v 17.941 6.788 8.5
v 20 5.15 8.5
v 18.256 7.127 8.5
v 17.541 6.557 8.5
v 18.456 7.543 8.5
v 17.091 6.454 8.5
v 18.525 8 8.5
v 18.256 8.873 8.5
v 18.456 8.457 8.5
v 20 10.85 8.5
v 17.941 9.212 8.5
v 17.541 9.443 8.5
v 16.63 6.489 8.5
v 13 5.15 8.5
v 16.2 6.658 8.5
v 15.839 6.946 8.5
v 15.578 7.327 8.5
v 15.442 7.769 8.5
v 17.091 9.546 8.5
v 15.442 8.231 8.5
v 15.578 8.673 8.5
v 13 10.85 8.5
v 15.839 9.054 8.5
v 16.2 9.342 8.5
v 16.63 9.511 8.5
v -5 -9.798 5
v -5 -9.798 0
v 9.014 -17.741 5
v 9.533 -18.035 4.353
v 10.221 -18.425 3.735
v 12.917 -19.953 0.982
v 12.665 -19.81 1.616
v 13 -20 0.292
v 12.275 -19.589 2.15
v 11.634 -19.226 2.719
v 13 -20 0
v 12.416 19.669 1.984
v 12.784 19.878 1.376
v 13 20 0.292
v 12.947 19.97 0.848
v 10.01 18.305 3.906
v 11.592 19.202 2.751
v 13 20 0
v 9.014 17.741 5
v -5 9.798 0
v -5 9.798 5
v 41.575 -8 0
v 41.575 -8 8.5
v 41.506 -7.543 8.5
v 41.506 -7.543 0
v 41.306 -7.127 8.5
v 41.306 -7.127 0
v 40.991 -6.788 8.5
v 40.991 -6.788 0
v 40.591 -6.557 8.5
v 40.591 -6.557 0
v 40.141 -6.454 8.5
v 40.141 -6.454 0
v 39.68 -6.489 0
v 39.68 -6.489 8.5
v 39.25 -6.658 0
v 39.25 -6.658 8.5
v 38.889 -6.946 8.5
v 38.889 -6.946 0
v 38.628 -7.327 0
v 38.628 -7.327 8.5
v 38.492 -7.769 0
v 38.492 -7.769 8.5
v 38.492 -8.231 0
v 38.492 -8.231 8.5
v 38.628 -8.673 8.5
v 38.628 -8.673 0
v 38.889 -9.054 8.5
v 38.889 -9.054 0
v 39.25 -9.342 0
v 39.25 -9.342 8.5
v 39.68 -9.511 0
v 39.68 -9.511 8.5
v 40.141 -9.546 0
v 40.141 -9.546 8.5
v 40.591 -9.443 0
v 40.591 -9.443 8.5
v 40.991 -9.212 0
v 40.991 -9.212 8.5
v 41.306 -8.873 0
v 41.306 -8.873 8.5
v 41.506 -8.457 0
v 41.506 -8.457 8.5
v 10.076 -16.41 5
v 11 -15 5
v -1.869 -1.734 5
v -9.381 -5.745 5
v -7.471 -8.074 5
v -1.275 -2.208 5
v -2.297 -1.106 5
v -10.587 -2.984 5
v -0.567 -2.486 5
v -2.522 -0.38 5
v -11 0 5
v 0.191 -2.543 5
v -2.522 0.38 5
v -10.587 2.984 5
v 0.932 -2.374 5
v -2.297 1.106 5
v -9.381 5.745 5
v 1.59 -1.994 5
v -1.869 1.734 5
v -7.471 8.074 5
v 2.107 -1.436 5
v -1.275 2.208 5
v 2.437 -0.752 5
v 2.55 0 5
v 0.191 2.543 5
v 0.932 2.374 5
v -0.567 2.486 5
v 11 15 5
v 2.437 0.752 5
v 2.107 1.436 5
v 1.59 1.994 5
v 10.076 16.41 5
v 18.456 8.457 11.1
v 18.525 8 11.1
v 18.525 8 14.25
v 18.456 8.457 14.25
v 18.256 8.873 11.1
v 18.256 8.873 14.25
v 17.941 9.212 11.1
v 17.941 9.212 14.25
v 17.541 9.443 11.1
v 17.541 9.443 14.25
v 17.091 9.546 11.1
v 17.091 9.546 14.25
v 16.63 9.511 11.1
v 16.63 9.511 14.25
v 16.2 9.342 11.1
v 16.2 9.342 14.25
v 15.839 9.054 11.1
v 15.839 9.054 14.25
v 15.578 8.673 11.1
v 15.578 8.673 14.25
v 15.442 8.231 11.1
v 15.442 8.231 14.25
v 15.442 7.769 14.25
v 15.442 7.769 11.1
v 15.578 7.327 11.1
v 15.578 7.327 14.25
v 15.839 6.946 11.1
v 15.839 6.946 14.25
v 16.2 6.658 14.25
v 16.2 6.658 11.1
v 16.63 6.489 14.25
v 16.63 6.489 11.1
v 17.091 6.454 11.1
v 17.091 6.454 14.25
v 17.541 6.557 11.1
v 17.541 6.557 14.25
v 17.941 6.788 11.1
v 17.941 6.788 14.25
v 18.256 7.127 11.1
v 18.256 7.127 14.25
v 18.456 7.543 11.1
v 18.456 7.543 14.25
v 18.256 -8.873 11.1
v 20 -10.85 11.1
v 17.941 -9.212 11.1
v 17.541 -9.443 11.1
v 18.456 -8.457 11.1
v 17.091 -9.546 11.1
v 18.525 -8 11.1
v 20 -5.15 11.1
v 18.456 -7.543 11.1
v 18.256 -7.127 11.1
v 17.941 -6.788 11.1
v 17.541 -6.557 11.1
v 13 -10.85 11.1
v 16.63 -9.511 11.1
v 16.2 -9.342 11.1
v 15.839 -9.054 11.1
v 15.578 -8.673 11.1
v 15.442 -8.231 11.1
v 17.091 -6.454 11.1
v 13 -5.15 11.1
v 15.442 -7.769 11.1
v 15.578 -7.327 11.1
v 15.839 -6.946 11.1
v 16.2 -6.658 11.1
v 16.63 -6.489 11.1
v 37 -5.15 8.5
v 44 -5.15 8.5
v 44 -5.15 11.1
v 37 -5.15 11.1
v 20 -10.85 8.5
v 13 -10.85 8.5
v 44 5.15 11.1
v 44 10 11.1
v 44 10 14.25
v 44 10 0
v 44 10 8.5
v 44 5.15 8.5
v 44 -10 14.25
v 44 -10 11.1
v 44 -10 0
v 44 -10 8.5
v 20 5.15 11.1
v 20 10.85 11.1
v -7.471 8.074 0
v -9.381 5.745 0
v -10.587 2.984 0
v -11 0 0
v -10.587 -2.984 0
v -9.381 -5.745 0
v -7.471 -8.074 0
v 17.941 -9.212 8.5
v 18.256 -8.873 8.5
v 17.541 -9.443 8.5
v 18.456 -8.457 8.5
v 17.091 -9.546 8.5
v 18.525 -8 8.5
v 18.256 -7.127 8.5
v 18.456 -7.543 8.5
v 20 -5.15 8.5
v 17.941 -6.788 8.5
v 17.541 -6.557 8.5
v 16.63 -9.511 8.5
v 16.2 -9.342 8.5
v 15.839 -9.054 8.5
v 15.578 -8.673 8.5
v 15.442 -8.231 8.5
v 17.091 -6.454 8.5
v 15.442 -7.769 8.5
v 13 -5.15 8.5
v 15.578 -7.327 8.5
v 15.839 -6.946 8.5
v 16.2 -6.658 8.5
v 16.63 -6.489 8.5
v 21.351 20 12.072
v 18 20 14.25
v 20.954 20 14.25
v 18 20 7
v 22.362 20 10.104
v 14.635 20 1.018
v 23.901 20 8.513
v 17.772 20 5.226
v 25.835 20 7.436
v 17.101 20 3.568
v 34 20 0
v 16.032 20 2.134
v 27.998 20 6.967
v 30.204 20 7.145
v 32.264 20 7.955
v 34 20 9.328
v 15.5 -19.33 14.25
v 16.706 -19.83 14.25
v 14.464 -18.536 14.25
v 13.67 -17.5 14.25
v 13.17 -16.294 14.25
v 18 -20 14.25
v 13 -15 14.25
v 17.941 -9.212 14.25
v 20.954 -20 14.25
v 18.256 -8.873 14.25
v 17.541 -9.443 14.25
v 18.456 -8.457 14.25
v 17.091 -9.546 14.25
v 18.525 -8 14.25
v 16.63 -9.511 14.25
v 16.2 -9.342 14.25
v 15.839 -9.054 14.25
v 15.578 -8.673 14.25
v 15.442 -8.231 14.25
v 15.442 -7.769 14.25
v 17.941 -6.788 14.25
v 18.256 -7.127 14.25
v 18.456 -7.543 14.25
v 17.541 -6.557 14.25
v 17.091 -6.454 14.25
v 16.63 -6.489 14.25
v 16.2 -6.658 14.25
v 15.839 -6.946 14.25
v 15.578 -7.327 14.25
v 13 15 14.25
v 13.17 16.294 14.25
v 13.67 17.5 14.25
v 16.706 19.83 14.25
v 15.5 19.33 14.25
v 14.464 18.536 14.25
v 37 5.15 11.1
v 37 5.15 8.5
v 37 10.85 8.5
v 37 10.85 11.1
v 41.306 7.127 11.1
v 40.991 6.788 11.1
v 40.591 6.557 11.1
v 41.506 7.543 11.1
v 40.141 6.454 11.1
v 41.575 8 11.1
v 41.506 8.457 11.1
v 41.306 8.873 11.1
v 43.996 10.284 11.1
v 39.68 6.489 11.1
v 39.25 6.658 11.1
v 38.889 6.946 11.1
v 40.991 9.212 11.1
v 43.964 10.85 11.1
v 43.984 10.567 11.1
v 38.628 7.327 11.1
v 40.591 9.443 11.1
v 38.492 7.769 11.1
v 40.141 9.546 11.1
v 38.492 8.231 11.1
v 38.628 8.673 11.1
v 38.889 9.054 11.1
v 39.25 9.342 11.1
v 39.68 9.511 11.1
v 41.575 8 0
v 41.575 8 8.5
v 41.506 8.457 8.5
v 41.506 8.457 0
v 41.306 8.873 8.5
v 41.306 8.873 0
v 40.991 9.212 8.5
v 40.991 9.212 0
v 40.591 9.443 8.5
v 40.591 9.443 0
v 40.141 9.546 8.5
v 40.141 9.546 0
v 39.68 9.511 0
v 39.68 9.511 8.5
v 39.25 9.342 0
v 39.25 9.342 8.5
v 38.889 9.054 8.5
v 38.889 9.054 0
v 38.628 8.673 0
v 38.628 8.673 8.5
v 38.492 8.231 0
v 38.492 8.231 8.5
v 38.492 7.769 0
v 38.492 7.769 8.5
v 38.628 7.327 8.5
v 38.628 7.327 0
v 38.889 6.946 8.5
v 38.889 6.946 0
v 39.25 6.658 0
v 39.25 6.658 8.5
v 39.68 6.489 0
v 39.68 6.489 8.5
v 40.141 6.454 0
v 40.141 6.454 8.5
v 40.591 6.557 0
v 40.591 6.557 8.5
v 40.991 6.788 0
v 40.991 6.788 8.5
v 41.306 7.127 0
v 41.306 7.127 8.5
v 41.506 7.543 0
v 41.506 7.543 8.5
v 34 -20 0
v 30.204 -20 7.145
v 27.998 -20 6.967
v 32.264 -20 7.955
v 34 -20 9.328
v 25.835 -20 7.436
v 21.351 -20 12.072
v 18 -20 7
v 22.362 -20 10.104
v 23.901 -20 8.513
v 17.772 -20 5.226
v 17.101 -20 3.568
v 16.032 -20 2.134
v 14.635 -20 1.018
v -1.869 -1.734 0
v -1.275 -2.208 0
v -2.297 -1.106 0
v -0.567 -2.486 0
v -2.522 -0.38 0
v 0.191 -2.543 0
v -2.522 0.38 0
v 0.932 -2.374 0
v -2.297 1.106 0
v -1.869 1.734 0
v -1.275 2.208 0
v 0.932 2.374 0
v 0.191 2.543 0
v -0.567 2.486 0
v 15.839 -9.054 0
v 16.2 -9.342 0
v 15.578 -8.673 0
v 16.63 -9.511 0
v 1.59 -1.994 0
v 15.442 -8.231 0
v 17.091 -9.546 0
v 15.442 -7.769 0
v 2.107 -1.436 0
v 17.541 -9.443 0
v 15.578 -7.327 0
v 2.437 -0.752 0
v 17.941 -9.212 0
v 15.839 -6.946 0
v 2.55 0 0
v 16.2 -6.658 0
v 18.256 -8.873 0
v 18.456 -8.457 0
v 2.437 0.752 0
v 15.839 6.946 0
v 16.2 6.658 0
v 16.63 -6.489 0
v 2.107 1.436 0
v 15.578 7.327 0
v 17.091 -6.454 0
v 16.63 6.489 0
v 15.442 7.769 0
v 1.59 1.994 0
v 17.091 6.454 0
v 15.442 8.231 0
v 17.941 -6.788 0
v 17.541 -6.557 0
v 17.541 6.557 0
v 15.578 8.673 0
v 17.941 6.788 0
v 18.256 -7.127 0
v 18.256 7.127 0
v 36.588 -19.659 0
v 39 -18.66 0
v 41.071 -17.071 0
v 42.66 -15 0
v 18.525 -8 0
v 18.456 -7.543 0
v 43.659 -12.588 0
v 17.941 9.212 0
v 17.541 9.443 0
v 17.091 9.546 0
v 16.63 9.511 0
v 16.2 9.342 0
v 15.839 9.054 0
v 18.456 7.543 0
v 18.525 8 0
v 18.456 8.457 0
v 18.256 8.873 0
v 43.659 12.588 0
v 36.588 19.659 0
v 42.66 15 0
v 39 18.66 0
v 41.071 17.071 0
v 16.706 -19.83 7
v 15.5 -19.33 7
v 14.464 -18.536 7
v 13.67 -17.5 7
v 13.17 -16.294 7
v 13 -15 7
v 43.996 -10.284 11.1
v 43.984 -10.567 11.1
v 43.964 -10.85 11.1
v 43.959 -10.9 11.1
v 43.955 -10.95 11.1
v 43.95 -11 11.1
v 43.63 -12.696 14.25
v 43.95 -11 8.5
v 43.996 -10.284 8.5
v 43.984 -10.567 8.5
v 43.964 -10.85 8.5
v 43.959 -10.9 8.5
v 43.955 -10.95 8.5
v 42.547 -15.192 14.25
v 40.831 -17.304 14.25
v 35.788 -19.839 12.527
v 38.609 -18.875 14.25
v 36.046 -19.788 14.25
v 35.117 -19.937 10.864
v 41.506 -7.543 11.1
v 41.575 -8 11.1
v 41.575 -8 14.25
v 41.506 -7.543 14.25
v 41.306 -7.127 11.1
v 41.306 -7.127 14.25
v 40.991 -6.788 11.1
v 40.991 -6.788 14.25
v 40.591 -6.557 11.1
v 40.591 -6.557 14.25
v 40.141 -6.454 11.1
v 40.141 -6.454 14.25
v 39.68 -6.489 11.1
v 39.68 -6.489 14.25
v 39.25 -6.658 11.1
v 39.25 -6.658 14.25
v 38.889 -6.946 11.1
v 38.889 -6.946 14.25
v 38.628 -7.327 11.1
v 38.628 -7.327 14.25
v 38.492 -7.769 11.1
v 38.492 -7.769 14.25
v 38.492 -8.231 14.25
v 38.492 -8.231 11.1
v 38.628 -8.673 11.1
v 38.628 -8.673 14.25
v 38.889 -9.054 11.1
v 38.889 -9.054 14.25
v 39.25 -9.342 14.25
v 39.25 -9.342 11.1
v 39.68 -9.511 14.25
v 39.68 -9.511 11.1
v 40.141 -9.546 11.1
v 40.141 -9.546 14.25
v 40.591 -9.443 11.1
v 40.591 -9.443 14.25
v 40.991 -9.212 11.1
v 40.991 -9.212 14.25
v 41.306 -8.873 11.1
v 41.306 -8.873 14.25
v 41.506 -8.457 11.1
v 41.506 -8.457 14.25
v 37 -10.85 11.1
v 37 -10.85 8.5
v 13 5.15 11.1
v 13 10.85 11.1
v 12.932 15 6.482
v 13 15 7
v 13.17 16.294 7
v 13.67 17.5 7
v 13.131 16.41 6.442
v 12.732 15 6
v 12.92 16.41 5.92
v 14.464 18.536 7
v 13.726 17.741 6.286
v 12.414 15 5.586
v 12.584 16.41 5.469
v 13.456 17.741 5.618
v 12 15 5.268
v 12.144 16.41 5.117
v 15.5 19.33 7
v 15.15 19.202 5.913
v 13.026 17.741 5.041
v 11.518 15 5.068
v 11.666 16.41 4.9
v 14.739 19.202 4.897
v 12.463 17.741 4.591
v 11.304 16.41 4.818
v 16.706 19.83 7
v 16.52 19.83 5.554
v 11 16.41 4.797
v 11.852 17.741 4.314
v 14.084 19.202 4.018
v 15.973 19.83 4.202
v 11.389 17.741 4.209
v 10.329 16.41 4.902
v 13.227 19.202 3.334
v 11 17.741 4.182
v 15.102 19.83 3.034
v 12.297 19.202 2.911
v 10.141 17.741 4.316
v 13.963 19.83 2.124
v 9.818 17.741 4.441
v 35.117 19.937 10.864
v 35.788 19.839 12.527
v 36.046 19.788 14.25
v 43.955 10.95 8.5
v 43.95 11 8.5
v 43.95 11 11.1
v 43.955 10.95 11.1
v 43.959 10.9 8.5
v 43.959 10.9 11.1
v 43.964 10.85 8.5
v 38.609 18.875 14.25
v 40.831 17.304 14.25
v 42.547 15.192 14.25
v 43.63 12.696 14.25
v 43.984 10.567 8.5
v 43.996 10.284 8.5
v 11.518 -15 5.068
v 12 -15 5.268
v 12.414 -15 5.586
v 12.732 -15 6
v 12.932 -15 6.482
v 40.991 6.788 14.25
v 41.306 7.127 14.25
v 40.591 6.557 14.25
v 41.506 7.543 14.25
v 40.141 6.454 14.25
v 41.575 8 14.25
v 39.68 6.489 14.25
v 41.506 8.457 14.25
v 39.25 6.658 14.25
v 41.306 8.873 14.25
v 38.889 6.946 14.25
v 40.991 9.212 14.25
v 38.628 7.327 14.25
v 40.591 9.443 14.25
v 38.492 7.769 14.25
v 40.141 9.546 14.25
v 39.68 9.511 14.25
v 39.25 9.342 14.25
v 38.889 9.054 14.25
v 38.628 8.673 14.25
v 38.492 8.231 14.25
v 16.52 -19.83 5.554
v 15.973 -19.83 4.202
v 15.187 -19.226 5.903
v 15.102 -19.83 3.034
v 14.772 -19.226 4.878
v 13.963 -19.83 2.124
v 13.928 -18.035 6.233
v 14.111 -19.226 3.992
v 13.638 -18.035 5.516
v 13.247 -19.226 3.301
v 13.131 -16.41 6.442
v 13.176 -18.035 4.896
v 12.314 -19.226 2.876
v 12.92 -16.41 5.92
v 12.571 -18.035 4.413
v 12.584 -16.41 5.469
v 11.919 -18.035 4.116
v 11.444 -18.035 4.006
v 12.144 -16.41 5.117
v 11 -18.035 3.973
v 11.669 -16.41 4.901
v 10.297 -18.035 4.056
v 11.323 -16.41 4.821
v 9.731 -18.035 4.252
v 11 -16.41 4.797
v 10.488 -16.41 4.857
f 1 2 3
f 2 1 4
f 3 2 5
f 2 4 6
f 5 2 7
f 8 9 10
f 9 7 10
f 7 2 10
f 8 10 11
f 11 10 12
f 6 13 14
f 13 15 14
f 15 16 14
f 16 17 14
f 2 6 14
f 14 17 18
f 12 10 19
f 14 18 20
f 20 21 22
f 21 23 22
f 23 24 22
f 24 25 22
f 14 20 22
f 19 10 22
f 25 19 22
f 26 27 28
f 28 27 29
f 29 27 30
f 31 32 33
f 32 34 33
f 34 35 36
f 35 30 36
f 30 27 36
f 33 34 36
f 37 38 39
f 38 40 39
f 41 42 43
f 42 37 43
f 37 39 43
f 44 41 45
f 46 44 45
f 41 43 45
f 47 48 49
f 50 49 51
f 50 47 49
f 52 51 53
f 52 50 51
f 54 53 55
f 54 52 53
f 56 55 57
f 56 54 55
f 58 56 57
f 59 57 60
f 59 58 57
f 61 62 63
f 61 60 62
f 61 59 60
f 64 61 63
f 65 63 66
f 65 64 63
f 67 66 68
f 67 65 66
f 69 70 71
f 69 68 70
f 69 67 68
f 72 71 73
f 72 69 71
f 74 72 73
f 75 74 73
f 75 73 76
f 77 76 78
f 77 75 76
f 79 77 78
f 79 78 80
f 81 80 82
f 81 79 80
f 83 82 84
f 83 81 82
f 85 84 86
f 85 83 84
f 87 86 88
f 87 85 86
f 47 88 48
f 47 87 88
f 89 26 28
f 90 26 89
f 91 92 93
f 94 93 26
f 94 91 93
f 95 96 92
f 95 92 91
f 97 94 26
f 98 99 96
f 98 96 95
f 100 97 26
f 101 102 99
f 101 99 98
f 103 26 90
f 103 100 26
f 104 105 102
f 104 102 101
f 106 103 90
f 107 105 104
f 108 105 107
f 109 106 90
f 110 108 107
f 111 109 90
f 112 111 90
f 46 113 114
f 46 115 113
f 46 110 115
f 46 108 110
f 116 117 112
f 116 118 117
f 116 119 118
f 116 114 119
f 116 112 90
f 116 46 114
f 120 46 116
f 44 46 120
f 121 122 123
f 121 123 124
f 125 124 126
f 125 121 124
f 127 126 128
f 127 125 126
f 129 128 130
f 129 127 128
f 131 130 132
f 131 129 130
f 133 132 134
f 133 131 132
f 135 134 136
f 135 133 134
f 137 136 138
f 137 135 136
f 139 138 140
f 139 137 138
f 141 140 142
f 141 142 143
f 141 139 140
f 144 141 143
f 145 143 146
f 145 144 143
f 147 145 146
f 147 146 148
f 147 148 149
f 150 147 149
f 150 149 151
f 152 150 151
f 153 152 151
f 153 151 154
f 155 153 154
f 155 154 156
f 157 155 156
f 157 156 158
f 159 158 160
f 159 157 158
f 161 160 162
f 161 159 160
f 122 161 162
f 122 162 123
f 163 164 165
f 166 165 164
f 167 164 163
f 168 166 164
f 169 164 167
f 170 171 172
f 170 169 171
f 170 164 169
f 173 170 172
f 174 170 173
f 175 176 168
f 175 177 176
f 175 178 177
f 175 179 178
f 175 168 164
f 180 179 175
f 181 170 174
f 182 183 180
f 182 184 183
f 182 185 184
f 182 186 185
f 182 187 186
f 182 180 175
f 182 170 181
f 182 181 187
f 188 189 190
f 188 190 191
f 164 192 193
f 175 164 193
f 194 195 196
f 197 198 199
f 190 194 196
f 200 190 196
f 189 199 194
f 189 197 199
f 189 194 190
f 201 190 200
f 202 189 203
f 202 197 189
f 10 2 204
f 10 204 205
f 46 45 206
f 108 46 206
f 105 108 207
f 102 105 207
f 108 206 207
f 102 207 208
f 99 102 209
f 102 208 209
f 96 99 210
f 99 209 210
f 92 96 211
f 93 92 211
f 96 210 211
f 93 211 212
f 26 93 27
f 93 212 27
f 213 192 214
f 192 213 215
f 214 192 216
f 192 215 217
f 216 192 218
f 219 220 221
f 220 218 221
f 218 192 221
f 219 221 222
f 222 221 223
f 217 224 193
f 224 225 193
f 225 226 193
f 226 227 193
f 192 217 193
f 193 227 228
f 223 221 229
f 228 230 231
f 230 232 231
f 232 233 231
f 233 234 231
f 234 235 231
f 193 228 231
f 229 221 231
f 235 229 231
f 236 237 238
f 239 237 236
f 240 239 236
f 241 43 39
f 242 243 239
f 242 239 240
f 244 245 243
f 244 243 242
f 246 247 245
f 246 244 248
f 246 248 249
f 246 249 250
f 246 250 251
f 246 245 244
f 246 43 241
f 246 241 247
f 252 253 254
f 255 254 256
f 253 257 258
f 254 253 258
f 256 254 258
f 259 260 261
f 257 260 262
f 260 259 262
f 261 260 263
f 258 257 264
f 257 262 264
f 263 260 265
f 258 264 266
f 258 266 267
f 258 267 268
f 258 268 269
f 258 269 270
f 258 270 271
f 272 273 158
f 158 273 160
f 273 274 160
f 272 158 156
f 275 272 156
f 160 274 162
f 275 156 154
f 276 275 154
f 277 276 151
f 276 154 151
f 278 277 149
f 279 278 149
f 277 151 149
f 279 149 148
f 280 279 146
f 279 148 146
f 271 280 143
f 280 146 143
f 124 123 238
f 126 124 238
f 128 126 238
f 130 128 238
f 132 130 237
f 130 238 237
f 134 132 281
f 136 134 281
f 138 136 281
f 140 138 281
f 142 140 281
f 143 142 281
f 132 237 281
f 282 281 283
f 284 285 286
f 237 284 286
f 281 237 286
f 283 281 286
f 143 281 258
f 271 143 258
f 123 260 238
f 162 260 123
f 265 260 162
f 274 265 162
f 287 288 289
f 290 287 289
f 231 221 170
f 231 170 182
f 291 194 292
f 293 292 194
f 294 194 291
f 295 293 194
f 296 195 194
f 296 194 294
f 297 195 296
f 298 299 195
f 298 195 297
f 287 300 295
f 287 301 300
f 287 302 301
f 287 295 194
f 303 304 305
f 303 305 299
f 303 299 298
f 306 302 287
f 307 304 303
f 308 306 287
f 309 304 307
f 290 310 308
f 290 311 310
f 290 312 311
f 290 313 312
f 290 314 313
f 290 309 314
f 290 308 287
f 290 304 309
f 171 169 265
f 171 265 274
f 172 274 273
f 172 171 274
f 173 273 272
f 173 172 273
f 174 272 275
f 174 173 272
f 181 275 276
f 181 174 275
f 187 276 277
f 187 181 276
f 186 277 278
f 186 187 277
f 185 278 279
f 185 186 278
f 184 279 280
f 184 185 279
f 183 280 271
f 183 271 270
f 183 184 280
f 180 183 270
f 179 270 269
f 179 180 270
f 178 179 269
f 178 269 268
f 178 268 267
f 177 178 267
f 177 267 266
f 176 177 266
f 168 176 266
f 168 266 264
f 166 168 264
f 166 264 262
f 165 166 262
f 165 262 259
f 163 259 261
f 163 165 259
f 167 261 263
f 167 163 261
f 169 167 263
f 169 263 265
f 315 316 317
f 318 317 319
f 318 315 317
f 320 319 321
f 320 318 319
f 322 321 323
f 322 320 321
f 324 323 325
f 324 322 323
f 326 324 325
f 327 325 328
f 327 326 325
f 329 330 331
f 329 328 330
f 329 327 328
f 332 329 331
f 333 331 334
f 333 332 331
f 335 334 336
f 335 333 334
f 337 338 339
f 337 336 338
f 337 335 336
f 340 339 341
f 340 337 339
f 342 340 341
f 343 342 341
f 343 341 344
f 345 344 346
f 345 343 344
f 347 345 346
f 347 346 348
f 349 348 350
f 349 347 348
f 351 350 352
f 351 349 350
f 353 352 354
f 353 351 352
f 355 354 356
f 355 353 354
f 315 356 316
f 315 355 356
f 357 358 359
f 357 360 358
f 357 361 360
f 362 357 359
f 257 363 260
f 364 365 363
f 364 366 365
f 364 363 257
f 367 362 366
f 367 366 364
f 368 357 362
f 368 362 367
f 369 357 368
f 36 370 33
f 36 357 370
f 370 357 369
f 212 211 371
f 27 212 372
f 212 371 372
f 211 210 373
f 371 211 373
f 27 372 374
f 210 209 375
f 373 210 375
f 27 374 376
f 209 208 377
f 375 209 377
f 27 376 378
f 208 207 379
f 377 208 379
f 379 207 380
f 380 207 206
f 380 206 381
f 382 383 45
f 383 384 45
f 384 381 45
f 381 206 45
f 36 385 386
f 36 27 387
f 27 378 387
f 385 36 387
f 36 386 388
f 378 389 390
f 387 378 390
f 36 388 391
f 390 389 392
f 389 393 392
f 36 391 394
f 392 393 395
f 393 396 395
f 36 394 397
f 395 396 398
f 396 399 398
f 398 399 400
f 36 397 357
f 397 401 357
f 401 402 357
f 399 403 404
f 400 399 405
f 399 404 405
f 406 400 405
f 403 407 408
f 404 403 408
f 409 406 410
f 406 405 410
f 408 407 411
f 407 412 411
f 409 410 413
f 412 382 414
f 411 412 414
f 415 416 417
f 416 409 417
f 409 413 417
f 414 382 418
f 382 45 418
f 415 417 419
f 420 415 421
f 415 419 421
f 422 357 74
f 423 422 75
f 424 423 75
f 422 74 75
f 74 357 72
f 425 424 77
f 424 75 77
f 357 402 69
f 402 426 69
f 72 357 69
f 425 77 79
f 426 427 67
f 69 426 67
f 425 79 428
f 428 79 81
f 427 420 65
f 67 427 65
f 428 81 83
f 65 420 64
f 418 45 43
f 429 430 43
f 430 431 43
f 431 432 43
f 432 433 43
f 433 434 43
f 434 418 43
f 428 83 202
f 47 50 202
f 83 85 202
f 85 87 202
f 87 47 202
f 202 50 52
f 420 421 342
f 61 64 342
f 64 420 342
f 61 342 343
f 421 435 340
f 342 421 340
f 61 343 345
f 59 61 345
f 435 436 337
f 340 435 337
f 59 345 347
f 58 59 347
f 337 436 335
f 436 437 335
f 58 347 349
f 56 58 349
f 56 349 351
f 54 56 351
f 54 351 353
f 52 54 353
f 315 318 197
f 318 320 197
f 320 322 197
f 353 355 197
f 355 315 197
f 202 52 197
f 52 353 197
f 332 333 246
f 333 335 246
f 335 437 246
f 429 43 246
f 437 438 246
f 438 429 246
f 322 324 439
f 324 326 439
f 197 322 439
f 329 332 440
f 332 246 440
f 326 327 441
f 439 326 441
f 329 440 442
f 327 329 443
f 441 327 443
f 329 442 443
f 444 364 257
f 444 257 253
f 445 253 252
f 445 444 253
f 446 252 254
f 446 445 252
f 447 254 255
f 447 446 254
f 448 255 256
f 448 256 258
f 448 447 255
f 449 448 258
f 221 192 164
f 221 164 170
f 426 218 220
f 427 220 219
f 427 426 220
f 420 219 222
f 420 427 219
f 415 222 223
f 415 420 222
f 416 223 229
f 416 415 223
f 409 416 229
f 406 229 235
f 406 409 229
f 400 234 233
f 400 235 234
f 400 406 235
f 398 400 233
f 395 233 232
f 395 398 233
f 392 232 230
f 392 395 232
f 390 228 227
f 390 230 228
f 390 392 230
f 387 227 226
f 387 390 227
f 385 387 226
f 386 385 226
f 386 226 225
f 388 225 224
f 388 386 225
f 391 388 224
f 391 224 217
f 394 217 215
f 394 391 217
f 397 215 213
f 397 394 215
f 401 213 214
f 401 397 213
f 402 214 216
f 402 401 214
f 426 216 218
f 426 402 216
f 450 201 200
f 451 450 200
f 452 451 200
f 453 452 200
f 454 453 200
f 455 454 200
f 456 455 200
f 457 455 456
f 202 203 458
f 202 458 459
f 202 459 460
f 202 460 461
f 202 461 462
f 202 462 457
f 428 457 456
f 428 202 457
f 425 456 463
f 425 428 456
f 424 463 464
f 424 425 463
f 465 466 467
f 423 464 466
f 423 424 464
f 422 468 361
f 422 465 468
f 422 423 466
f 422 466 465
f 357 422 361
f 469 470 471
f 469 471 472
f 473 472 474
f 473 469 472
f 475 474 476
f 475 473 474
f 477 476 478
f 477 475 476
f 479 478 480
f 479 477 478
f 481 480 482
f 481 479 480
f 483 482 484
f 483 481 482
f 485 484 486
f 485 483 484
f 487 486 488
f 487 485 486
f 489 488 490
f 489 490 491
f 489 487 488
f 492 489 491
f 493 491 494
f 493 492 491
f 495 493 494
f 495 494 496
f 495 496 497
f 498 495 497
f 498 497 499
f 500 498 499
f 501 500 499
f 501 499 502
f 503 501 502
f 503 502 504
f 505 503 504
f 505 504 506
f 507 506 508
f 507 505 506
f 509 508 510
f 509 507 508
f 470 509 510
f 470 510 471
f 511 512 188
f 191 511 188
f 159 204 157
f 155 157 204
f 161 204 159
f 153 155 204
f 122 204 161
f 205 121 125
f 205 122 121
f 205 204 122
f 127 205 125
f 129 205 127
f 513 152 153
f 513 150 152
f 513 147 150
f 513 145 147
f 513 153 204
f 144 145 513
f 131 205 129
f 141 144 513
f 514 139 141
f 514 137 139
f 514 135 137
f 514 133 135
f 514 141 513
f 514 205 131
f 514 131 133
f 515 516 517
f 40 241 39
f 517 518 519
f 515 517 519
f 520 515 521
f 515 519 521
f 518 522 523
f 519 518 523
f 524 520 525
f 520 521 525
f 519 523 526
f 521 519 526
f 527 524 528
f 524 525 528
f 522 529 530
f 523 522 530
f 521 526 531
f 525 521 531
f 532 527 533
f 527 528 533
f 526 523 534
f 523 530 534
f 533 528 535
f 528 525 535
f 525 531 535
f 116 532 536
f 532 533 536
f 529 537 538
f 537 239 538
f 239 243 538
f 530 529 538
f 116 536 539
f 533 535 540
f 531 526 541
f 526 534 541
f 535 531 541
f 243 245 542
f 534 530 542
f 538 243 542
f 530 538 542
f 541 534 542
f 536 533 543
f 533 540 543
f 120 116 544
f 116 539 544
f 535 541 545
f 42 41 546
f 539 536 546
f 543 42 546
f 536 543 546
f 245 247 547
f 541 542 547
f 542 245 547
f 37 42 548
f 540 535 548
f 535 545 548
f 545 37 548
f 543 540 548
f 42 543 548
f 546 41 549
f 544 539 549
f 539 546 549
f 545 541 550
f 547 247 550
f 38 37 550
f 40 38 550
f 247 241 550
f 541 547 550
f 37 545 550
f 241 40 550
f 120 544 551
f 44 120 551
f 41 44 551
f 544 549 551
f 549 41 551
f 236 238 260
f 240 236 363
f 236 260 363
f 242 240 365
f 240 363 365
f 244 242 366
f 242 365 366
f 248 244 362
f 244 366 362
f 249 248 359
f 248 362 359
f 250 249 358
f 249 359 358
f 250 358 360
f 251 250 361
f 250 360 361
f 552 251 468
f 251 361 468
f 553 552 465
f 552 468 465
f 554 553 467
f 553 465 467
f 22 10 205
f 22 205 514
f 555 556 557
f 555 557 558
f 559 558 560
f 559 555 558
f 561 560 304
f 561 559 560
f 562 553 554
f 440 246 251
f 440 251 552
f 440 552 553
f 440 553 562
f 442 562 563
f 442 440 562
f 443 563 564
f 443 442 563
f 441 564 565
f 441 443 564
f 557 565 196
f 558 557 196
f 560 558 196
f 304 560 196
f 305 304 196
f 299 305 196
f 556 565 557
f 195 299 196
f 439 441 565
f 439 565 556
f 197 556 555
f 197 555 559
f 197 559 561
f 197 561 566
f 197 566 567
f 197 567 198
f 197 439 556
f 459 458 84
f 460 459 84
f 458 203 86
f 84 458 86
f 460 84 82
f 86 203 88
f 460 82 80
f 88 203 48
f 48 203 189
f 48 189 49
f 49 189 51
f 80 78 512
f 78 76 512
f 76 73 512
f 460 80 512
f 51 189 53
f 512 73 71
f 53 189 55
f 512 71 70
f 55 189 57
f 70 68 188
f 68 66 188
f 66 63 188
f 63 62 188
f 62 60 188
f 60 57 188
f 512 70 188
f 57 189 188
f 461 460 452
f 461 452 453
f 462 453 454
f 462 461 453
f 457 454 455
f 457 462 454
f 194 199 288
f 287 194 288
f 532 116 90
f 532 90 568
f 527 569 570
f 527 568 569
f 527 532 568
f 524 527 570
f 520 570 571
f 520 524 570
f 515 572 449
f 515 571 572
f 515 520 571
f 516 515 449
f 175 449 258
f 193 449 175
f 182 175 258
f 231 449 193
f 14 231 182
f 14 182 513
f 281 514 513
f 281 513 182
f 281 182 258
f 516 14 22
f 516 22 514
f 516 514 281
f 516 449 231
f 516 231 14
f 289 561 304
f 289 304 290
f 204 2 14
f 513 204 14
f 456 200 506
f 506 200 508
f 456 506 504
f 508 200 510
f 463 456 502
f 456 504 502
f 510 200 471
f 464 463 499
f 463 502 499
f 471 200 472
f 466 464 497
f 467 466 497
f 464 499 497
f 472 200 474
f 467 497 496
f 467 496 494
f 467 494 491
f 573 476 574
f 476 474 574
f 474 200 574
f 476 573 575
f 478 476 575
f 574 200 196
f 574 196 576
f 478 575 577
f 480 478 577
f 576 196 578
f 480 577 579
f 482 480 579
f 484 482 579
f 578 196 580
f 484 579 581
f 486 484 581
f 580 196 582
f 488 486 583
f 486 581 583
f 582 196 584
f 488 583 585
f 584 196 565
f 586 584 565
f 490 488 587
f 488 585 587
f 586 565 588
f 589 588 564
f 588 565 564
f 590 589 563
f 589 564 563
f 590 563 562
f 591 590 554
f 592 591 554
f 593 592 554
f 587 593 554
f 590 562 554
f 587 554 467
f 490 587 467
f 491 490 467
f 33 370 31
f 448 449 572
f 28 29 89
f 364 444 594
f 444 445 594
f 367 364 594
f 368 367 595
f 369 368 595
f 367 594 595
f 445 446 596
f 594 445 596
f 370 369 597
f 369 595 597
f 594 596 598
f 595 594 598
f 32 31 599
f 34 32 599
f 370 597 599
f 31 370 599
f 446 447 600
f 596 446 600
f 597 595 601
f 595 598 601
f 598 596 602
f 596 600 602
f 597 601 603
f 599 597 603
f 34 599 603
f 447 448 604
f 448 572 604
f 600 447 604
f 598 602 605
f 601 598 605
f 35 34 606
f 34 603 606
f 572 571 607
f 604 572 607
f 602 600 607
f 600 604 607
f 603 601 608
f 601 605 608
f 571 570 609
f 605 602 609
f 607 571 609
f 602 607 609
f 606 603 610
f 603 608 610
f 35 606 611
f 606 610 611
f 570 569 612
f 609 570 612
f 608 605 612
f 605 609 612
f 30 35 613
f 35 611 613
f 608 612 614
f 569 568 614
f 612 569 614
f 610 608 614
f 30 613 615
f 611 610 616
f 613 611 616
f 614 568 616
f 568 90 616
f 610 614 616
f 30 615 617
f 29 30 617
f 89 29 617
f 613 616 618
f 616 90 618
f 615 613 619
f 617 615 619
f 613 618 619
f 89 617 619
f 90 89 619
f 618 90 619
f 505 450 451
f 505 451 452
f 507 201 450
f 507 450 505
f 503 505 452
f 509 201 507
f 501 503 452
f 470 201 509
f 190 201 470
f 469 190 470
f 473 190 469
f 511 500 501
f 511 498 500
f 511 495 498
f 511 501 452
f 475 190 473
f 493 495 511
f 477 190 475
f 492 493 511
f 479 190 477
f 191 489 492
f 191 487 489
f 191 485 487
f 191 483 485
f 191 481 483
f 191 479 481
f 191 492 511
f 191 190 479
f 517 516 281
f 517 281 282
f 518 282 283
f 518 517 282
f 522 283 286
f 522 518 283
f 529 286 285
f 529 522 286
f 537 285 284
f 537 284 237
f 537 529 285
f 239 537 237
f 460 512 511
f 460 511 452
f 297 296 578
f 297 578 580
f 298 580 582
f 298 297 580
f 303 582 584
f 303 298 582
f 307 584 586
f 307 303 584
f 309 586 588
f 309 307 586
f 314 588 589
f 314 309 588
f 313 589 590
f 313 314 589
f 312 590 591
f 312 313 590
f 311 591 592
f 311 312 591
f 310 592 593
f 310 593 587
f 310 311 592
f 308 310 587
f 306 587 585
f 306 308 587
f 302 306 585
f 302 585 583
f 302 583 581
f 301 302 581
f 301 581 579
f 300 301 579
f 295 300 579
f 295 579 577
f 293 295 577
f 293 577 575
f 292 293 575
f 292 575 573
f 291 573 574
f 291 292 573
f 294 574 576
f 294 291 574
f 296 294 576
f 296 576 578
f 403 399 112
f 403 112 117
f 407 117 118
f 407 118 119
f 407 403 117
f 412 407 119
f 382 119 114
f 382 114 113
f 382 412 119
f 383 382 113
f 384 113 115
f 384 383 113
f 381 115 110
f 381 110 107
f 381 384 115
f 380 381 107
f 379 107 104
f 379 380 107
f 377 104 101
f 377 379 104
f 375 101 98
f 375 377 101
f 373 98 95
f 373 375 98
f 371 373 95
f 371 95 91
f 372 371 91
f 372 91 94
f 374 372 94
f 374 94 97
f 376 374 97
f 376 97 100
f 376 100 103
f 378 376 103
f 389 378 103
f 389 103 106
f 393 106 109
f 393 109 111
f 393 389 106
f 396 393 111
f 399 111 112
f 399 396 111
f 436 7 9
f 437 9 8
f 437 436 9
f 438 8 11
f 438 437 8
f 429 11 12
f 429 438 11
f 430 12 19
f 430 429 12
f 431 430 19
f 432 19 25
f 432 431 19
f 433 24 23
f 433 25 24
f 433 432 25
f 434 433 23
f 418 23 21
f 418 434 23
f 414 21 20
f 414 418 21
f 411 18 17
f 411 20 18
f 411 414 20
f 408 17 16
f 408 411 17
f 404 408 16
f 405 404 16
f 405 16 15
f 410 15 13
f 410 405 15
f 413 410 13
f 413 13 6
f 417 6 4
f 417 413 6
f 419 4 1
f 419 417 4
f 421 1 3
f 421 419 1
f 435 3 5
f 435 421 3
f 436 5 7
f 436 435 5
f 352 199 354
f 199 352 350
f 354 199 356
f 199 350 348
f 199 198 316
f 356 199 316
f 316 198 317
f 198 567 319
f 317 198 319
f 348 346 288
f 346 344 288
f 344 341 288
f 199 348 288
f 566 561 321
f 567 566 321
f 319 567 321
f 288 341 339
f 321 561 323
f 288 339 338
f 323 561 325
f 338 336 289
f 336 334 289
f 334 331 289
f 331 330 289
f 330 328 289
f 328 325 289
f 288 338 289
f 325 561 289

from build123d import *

# Parameters (mm, degrees)
SKETCH_3_R          = 2.55
SKETCH_3_R_2        = 1.55
EXTRUDE_1_DEPTH     = 5
SKETCH_4_R          = 1.55
EXTRUDE_2_DEPTH     = 9.25
FILLET_2_R          = 2
FILLET_START        = 6.9999999
FILLET_3_2_DEPTH    = 8.0000001
SKETCH_5_W          = 7
SKETCH_5_H          = 6
CUT_EXTRUDE_1_DEPTH = 2.6
SKETCH_6_R          = 7.55
CUT_EXTRUDE_2_DEPTH = 62.147874109
EXTRUDE_START       = 2.6
SKETCH_7_W          = 7
SKETCH_7_H          = 0.15
EXTRUDE_3_DEPTH     = 2.6


with BuildPart() as part:
    # 草图3 → 凸台-拉伸1 (new body)
    with BuildSketch(Plane.XY):
        with BuildLine():
            Line((13, 20), (-5, 9.797958971))
            ThreePointArc((-5, 9.797958971), (-11, 0), (-5, -9.797958971))
            Line((-5, -9.797958971), (13, -20))
            Line((13, -20), (34, -20))
            ThreePointArc((34, -20), (41.071067812, -17.071067812), (44, -10))
            Line((44, -10), (44, 10))
            ThreePointArc((44, 10), (41.071067812, 17.071067812), (34, 20))
            Line((34, 20), (13, 20))
        make_face()
        Circle(SKETCH_3_R, mode=Mode.SUBTRACT)
        with Locations((16.975, -8)):
            Circle(SKETCH_3_R_2, mode=Mode.SUBTRACT)
        with Locations((16.975, 8)):
            Circle(SKETCH_3_R_2, mode=Mode.SUBTRACT)
        with Locations((40.025, 8)):
            Circle(SKETCH_3_R_2, mode=Mode.SUBTRACT)
        with Locations((40.025, -8)):
            Circle(SKETCH_3_R_2, mode=Mode.SUBTRACT)
    extrude(amount=EXTRUDE_1_DEPTH)

    # 草图4 → 凸台-拉伸2 (add)
    with BuildSketch(Plane.XY.offset(5)):
        with BuildLine():
            Line((13, -15), (13, 15))
            Line((13, 15), (13, 20))
            Line((13, 20), (18, 20))
            Line((18, 20), (34, 20))
            ThreePointArc((34, 20), (41.071067812, 17.071067812), (44, 10))
            Line((44, 10), (44, -10))
            ThreePointArc((44, -10), (41.071067812, -17.071067812), (34, -20))
            Line((34, -20), (18, -20))
            Line((18, -20), (13, -20))
            Line((13, -20), (13, -15))
        make_face()
        with Locations((16.975, 8)):
            Circle(SKETCH_4_R, mode=Mode.SUBTRACT)
        with Locations((16.975, -8)):
            Circle(SKETCH_4_R, mode=Mode.SUBTRACT)
        with Locations((40.025, -8)):
            Circle(SKETCH_4_R, mode=Mode.SUBTRACT)
        with Locations((40.025, 8)):
            Circle(SKETCH_4_R, mode=Mode.SUBTRACT)
    extrude(amount=EXTRUDE_2_DEPTH)

    # 圆角2
    fillet_2_edges = [part.edges().sort_by_distance(p)[0] for p in [
        (13, 0, 5),
    ]]
    fillet(fillet_2_edges, radius=FILLET_2_R)

    # 圆角3: read off the stored shape, not the designer's step
    # 圆角3 outline → 圆角3 (revolve, cut)
    with BuildSketch(Plane(origin=(11, 0, 7), x_dir=(1, 0, 0), z_dir=(0, 0, 1))):
        with BuildLine():
            ThreePointArc((7, -20), (3.464466094, -18.535533906), (2, -15))
            Line((2, -15), (2, -20))
            Line((2, -20), (7, -20))
        make_face()
        with BuildLine():
            Line((2, 20), (2, 15))
            ThreePointArc((2, 15), (3.464466094, 18.535533906), (7, 20))
            Line((7, 20), (2, 20))
        make_face()
    revolve(axis=Axis((11, 0, 7), (0, 1, 0)), mode=Mode.SUBTRACT)

    # Fillet 3 2 outline → Fillet 3 2 (cut)
    with BuildSketch(Plane.XY.offset(FILLET_START)):
        with BuildLine():
            Line((13, -20), (18, -20))
            ThreePointArc((18, -20), (14.464466094, -18.535533906), (13, -15))
            Line((13, -15), (13, -20))
        make_face()
        with BuildLine():
            Line((13, 20), (13, 15))
            ThreePointArc((13, 15), (14.464466094, 18.535533906), (18, 20))
            Line((18, 20), (13, 20))
        make_face()
    extrude(amount=FILLET_3_2_DEPTH, mode=Mode.SUBTRACT)

    # 草图5 → 切除-拉伸1 (cut)
    with BuildSketch(Plane(origin=(0, 0, 8.5), x_dir=(-1, 0, 0), z_dir=(0, 0, -1))):
        with Locations((-40.5, 8)):
            Rectangle(SKETCH_5_W, SKETCH_5_H)
        with Locations((-40.5, -8)):
            Rectangle(SKETCH_5_W, SKETCH_5_H)
        with Locations((-16.5, -8)):
            Rectangle(SKETCH_5_W, SKETCH_5_H)
        with Locations((-16.5, 8)):
            Rectangle(SKETCH_5_W, SKETCH_5_H)
    extrude(amount=-CUT_EXTRUDE_1_DEPTH, mode=Mode.SUBTRACT)

    # 草图6 → 切除-拉伸2 (cut, through all)
    with BuildSketch(Plane.XZ.offset(20)):
        with Locations((28.5, 14.5)):
            Circle(SKETCH_6_R)
    extrude(amount=-CUT_EXTRUDE_2_DEPTH, mode=Mode.SUBTRACT)

    # 草图7 → 凸台-拉伸3 (add)
    with BuildSketch(Plane(origin=(0, 0, 11.1), x_dir=(-1, 0, 0), z_dir=(0, 0, -1)).offset(EXTRUDE_START)):
        with BuildLine():
            Line((-37, 11), (-43.949874371, 11))
            ThreePointArc((-43.949874371, 11), (-43.957124407, 10.925026241), (-43.963809512, 10.85))
            Line((-43.963809512, 10.85), (-37, 10.85))
            Line((-37, 10.85), (-37, 11))
        make_face()
        with Locations((-40.5, 5.075)):
            Rectangle(SKETCH_7_W, SKETCH_7_H)
        with Locations((-40.5, -5.075)):
            Rectangle(SKETCH_7_W, SKETCH_7_H)
        with BuildLine():
            Line((-37, -11), (-37, -10.85))
            Line((-37, -10.85), (-43.963809512, -10.85))
            ThreePointArc((-43.963809512, -10.85), (-43.957124407, -10.925026241), (-43.949874371, -11))
            Line((-43.949874371, -11), (-37, -11))
        make_face()
        with Locations((-16.5, -10.925)):
            Rectangle(SKETCH_7_W, SKETCH_7_H)
        with Locations((-16.5, -5.075)):
            Rectangle(SKETCH_7_W, SKETCH_7_H)
        with Locations((-16.5, 5.075)):
            Rectangle(SKETCH_7_W, SKETCH_7_H)
        with Locations((-16.5, 10.925)):
            Rectangle(SKETCH_7_W, SKETCH_7_H)
    extrude(amount=-EXTRUDE_3_DEPTH)


solid = part.part
